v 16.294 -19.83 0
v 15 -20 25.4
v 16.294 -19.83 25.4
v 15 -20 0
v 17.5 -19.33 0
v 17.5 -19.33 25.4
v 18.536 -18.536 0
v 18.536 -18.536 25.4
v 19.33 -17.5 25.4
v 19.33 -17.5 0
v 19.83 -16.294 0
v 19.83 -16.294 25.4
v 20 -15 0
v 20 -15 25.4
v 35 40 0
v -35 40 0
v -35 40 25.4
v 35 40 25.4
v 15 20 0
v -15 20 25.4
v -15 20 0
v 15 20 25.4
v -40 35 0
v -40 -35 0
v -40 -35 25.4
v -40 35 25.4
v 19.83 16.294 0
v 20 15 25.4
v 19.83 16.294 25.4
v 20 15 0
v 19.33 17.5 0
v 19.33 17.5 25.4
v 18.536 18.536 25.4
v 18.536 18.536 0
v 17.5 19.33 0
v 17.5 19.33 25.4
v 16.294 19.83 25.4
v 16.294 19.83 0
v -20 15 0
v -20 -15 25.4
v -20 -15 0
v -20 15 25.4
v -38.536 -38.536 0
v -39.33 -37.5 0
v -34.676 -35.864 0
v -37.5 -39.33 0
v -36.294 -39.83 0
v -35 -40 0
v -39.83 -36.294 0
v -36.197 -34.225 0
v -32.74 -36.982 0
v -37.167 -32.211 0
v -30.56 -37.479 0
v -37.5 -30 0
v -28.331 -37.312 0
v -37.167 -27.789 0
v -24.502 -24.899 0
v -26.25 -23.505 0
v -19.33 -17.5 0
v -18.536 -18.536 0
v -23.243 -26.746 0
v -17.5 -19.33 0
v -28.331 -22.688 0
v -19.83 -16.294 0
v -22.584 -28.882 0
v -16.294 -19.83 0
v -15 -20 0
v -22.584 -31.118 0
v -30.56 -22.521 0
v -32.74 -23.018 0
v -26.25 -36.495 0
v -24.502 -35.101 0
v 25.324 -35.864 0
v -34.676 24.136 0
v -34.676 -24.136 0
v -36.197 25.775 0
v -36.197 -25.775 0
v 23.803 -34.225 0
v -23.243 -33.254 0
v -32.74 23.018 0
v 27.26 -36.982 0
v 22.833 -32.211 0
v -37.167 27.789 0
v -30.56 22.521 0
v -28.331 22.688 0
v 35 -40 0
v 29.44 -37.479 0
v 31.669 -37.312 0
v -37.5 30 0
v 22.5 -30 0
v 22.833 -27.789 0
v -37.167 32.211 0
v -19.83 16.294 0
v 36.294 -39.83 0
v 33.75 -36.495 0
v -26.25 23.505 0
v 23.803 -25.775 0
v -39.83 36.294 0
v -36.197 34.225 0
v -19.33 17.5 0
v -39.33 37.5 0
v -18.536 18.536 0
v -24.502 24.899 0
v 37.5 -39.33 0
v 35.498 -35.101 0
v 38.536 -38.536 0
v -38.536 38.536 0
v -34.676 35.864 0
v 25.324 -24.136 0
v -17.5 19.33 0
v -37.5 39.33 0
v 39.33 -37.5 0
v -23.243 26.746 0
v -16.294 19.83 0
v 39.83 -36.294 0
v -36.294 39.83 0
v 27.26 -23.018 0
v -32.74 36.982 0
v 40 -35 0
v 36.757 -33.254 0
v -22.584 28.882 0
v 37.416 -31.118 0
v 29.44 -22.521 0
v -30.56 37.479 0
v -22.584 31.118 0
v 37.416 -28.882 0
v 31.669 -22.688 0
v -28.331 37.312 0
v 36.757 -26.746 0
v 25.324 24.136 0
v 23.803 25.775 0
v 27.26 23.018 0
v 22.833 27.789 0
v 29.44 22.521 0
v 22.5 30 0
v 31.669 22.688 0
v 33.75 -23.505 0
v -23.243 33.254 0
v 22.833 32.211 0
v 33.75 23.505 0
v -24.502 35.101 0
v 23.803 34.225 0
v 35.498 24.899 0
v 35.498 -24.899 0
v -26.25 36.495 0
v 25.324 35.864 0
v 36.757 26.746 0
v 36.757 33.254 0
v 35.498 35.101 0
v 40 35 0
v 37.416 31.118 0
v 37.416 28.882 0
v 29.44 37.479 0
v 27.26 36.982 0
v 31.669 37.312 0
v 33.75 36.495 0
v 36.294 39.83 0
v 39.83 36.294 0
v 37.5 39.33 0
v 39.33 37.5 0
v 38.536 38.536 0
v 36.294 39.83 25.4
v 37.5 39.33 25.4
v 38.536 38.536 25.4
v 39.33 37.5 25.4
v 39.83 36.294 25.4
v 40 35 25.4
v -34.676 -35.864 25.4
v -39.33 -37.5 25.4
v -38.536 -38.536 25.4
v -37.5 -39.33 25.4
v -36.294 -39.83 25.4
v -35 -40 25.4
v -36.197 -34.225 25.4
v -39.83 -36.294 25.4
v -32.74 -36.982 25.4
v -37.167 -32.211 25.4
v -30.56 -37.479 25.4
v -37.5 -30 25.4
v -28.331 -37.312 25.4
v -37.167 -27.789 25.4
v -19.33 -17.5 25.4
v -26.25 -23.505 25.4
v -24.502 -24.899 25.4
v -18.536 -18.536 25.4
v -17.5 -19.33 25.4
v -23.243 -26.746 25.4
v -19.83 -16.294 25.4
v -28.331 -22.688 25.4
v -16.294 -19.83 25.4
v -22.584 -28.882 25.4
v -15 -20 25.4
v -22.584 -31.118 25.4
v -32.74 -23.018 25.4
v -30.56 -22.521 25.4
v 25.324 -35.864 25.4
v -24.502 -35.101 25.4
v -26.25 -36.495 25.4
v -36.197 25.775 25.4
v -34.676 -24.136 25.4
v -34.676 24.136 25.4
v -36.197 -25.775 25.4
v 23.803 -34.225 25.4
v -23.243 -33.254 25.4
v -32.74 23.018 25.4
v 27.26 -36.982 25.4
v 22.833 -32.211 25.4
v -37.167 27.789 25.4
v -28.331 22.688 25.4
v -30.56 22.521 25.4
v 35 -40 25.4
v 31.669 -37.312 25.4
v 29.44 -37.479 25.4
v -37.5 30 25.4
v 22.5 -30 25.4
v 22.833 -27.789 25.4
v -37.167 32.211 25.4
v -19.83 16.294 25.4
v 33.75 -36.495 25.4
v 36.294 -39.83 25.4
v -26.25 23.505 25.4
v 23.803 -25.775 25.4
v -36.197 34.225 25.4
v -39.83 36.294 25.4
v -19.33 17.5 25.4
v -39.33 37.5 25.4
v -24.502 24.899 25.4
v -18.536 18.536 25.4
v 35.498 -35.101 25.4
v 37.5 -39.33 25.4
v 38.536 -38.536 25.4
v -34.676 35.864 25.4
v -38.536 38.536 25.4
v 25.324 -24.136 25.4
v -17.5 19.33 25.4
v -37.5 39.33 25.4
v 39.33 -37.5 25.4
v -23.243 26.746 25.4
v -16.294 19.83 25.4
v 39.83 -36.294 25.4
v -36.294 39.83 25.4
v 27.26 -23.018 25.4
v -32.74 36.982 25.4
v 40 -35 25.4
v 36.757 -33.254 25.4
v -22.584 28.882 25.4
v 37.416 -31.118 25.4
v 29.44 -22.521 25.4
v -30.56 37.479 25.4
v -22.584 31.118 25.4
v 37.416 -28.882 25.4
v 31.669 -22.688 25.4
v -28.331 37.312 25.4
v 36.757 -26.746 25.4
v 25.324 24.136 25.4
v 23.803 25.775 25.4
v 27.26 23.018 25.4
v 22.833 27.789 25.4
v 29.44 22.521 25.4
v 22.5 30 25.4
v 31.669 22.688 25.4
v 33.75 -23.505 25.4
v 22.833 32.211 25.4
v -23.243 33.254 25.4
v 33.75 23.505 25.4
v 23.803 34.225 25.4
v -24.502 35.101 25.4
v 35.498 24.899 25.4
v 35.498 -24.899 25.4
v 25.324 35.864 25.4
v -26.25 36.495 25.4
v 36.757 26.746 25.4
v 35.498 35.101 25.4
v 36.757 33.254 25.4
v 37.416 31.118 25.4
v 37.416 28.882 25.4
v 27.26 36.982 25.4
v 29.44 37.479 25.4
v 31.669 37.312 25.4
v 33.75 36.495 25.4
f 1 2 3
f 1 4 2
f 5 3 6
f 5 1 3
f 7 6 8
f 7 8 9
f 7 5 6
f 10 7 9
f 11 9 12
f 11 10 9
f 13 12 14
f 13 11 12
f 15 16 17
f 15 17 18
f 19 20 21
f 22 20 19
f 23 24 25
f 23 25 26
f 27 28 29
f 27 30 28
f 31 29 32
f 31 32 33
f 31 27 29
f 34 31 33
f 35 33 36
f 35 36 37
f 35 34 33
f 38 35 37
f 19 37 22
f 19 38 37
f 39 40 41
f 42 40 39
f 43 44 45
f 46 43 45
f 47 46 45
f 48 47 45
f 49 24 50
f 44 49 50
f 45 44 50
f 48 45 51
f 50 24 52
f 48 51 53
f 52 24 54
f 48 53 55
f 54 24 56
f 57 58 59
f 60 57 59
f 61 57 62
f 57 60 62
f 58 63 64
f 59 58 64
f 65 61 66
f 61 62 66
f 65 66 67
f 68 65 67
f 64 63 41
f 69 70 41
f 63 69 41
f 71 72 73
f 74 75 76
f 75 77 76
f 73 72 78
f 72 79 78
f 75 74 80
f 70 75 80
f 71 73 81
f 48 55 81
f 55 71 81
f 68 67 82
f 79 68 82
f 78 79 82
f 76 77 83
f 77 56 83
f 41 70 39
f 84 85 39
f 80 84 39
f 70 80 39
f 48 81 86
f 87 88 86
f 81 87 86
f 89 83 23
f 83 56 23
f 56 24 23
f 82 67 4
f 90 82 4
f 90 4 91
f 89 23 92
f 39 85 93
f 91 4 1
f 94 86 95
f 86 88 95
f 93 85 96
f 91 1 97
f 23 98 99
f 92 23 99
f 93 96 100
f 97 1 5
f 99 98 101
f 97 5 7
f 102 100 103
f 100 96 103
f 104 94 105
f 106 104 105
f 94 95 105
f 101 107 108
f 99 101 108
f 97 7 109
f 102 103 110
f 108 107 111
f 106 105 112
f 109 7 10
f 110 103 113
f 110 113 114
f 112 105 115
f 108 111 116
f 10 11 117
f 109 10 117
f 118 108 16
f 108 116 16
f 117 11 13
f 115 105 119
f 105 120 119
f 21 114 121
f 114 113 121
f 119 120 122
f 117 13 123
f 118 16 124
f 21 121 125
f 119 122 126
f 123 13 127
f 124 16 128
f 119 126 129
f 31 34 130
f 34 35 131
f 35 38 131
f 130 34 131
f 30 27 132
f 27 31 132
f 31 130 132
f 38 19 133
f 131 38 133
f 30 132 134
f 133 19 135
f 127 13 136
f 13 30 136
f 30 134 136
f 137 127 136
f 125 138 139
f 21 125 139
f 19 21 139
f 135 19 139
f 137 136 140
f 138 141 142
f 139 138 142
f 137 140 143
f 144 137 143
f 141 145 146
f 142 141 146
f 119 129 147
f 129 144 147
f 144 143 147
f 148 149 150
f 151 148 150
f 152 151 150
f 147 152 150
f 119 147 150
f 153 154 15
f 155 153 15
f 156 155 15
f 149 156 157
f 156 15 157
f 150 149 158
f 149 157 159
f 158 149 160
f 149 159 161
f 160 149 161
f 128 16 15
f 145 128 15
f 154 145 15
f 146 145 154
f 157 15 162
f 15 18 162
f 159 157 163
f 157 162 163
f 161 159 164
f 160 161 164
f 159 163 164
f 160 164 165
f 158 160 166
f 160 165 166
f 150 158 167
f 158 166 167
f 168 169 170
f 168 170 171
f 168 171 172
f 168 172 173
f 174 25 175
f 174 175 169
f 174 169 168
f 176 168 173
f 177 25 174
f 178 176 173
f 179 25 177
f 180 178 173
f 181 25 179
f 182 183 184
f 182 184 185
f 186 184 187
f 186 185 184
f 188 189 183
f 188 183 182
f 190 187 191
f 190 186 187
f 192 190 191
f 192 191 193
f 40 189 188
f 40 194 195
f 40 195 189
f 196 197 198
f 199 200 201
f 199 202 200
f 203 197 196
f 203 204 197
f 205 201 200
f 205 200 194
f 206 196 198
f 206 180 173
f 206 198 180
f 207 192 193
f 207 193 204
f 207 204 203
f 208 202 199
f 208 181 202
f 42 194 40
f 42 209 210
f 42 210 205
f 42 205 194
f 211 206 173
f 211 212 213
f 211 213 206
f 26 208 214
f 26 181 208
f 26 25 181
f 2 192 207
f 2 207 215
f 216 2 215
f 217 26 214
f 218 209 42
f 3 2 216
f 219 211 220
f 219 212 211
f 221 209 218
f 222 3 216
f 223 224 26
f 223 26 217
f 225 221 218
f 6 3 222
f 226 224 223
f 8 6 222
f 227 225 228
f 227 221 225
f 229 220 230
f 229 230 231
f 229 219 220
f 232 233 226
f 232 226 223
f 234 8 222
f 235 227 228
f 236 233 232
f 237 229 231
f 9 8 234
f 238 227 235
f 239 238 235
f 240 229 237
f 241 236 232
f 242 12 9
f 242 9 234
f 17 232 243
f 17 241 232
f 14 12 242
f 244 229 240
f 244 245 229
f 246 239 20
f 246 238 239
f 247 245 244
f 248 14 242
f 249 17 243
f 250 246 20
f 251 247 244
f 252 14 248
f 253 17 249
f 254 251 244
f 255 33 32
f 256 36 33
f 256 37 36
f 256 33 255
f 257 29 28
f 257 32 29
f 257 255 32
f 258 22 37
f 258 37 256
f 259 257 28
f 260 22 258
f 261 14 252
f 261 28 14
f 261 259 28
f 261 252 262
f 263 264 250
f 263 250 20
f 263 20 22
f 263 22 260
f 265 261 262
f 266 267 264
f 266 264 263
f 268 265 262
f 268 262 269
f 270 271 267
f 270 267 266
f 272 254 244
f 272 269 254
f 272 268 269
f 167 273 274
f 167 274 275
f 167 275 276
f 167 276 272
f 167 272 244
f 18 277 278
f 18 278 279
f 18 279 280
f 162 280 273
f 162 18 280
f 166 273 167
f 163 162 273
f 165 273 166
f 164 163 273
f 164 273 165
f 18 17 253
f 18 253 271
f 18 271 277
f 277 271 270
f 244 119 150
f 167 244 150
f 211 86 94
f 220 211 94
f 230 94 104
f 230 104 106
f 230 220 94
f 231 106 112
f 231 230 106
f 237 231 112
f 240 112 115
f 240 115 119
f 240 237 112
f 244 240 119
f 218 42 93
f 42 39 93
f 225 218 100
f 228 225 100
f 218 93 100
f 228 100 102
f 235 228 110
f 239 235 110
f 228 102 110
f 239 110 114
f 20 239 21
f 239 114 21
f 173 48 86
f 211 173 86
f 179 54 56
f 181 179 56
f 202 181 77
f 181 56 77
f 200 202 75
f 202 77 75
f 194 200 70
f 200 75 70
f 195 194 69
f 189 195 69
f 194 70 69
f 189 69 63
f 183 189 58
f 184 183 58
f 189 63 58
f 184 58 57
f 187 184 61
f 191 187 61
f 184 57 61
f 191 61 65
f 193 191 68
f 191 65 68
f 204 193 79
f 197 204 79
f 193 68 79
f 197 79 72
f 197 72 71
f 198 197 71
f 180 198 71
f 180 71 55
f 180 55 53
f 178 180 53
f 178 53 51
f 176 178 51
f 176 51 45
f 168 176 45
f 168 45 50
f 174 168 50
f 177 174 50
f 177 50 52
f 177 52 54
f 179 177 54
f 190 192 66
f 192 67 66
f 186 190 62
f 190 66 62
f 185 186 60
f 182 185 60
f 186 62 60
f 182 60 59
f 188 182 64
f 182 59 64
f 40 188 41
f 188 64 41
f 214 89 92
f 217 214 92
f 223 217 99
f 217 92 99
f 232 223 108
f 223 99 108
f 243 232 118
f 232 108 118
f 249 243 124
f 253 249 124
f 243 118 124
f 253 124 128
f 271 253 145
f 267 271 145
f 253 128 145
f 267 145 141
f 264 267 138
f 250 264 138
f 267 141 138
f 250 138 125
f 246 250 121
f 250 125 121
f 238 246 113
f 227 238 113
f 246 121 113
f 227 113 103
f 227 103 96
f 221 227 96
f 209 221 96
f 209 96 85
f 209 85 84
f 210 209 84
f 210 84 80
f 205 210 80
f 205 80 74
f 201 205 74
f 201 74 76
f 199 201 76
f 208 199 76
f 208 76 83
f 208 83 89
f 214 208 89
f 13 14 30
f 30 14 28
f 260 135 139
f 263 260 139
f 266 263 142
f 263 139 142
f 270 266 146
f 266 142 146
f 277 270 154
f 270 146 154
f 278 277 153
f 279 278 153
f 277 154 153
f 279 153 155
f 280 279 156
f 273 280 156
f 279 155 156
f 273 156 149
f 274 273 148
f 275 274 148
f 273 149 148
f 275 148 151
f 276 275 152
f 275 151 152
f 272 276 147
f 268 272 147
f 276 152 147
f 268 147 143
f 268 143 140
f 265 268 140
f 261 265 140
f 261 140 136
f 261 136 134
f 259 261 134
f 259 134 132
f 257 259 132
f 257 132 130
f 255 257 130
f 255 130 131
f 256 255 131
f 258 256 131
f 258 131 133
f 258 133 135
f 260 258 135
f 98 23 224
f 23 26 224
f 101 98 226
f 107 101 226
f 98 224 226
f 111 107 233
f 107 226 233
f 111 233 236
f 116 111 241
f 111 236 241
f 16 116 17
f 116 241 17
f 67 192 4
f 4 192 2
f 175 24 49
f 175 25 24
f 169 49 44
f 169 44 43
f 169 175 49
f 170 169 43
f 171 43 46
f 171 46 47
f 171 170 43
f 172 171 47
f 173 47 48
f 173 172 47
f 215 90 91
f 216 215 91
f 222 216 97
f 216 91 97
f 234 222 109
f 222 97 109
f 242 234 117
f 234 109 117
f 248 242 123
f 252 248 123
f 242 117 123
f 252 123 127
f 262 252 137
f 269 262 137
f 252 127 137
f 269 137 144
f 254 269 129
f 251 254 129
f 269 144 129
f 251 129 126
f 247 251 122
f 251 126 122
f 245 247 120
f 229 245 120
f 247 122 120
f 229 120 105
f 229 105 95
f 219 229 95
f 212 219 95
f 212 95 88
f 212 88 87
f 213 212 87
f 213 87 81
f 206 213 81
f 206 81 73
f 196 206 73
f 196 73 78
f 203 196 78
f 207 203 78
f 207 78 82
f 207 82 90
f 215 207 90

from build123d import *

# Parameters (mm, degrees)
F0_W     = 80
F0_H     = 80
F1_DEPTH = 25.4
F2_W     = 40
F2_H     = 40
F3_DEPTH = 25.4
F5_D     = 15
F6_R     = 5
F7_R     = 5


with BuildPart() as f1:
    # F0 (on Top) → F1 (new body)
    with BuildSketch(Plane.XY):
        Rectangle(F0_W, F0_H)
    extrude(amount=F1_DEPTH)

    # F2 (on face) → F3 (cut)
    with BuildSketch(Plane.XY.offset(25.4)):
        Rectangle(F2_W, F2_H)
    extrude(amount=-F3_DEPTH, mode=Mode.SUBTRACT)

    # F5 (through all)
    with Locations(Plane.XY.offset(25.4)):
        with Locations((-30, -30), (30, -30), (30, 30), (-30, 30)):
            Hole(F5_D / 2)

    # F6
    f6_edges = [f1.edges().sort_by_distance(p)[0] for p in [
        (40, -40, 12.7),
        (-40, -40, 12.7),
        (40, 40, 12.7),
        (-40, 40, 12.7),
    ]]
    fillet(f6_edges, radius=F6_R)

    # F7
    f7_edges = [f1.edges().sort_by_distance(p)[0] for p in [
        (-20, 20, 12.7),
        (-20, -20, 12.7),
        (20, 20, 12.7),
        (20, -20, 12.7),
    ]]
    fillet(f7_edges, radius=F7_R)


solid = f1.part
